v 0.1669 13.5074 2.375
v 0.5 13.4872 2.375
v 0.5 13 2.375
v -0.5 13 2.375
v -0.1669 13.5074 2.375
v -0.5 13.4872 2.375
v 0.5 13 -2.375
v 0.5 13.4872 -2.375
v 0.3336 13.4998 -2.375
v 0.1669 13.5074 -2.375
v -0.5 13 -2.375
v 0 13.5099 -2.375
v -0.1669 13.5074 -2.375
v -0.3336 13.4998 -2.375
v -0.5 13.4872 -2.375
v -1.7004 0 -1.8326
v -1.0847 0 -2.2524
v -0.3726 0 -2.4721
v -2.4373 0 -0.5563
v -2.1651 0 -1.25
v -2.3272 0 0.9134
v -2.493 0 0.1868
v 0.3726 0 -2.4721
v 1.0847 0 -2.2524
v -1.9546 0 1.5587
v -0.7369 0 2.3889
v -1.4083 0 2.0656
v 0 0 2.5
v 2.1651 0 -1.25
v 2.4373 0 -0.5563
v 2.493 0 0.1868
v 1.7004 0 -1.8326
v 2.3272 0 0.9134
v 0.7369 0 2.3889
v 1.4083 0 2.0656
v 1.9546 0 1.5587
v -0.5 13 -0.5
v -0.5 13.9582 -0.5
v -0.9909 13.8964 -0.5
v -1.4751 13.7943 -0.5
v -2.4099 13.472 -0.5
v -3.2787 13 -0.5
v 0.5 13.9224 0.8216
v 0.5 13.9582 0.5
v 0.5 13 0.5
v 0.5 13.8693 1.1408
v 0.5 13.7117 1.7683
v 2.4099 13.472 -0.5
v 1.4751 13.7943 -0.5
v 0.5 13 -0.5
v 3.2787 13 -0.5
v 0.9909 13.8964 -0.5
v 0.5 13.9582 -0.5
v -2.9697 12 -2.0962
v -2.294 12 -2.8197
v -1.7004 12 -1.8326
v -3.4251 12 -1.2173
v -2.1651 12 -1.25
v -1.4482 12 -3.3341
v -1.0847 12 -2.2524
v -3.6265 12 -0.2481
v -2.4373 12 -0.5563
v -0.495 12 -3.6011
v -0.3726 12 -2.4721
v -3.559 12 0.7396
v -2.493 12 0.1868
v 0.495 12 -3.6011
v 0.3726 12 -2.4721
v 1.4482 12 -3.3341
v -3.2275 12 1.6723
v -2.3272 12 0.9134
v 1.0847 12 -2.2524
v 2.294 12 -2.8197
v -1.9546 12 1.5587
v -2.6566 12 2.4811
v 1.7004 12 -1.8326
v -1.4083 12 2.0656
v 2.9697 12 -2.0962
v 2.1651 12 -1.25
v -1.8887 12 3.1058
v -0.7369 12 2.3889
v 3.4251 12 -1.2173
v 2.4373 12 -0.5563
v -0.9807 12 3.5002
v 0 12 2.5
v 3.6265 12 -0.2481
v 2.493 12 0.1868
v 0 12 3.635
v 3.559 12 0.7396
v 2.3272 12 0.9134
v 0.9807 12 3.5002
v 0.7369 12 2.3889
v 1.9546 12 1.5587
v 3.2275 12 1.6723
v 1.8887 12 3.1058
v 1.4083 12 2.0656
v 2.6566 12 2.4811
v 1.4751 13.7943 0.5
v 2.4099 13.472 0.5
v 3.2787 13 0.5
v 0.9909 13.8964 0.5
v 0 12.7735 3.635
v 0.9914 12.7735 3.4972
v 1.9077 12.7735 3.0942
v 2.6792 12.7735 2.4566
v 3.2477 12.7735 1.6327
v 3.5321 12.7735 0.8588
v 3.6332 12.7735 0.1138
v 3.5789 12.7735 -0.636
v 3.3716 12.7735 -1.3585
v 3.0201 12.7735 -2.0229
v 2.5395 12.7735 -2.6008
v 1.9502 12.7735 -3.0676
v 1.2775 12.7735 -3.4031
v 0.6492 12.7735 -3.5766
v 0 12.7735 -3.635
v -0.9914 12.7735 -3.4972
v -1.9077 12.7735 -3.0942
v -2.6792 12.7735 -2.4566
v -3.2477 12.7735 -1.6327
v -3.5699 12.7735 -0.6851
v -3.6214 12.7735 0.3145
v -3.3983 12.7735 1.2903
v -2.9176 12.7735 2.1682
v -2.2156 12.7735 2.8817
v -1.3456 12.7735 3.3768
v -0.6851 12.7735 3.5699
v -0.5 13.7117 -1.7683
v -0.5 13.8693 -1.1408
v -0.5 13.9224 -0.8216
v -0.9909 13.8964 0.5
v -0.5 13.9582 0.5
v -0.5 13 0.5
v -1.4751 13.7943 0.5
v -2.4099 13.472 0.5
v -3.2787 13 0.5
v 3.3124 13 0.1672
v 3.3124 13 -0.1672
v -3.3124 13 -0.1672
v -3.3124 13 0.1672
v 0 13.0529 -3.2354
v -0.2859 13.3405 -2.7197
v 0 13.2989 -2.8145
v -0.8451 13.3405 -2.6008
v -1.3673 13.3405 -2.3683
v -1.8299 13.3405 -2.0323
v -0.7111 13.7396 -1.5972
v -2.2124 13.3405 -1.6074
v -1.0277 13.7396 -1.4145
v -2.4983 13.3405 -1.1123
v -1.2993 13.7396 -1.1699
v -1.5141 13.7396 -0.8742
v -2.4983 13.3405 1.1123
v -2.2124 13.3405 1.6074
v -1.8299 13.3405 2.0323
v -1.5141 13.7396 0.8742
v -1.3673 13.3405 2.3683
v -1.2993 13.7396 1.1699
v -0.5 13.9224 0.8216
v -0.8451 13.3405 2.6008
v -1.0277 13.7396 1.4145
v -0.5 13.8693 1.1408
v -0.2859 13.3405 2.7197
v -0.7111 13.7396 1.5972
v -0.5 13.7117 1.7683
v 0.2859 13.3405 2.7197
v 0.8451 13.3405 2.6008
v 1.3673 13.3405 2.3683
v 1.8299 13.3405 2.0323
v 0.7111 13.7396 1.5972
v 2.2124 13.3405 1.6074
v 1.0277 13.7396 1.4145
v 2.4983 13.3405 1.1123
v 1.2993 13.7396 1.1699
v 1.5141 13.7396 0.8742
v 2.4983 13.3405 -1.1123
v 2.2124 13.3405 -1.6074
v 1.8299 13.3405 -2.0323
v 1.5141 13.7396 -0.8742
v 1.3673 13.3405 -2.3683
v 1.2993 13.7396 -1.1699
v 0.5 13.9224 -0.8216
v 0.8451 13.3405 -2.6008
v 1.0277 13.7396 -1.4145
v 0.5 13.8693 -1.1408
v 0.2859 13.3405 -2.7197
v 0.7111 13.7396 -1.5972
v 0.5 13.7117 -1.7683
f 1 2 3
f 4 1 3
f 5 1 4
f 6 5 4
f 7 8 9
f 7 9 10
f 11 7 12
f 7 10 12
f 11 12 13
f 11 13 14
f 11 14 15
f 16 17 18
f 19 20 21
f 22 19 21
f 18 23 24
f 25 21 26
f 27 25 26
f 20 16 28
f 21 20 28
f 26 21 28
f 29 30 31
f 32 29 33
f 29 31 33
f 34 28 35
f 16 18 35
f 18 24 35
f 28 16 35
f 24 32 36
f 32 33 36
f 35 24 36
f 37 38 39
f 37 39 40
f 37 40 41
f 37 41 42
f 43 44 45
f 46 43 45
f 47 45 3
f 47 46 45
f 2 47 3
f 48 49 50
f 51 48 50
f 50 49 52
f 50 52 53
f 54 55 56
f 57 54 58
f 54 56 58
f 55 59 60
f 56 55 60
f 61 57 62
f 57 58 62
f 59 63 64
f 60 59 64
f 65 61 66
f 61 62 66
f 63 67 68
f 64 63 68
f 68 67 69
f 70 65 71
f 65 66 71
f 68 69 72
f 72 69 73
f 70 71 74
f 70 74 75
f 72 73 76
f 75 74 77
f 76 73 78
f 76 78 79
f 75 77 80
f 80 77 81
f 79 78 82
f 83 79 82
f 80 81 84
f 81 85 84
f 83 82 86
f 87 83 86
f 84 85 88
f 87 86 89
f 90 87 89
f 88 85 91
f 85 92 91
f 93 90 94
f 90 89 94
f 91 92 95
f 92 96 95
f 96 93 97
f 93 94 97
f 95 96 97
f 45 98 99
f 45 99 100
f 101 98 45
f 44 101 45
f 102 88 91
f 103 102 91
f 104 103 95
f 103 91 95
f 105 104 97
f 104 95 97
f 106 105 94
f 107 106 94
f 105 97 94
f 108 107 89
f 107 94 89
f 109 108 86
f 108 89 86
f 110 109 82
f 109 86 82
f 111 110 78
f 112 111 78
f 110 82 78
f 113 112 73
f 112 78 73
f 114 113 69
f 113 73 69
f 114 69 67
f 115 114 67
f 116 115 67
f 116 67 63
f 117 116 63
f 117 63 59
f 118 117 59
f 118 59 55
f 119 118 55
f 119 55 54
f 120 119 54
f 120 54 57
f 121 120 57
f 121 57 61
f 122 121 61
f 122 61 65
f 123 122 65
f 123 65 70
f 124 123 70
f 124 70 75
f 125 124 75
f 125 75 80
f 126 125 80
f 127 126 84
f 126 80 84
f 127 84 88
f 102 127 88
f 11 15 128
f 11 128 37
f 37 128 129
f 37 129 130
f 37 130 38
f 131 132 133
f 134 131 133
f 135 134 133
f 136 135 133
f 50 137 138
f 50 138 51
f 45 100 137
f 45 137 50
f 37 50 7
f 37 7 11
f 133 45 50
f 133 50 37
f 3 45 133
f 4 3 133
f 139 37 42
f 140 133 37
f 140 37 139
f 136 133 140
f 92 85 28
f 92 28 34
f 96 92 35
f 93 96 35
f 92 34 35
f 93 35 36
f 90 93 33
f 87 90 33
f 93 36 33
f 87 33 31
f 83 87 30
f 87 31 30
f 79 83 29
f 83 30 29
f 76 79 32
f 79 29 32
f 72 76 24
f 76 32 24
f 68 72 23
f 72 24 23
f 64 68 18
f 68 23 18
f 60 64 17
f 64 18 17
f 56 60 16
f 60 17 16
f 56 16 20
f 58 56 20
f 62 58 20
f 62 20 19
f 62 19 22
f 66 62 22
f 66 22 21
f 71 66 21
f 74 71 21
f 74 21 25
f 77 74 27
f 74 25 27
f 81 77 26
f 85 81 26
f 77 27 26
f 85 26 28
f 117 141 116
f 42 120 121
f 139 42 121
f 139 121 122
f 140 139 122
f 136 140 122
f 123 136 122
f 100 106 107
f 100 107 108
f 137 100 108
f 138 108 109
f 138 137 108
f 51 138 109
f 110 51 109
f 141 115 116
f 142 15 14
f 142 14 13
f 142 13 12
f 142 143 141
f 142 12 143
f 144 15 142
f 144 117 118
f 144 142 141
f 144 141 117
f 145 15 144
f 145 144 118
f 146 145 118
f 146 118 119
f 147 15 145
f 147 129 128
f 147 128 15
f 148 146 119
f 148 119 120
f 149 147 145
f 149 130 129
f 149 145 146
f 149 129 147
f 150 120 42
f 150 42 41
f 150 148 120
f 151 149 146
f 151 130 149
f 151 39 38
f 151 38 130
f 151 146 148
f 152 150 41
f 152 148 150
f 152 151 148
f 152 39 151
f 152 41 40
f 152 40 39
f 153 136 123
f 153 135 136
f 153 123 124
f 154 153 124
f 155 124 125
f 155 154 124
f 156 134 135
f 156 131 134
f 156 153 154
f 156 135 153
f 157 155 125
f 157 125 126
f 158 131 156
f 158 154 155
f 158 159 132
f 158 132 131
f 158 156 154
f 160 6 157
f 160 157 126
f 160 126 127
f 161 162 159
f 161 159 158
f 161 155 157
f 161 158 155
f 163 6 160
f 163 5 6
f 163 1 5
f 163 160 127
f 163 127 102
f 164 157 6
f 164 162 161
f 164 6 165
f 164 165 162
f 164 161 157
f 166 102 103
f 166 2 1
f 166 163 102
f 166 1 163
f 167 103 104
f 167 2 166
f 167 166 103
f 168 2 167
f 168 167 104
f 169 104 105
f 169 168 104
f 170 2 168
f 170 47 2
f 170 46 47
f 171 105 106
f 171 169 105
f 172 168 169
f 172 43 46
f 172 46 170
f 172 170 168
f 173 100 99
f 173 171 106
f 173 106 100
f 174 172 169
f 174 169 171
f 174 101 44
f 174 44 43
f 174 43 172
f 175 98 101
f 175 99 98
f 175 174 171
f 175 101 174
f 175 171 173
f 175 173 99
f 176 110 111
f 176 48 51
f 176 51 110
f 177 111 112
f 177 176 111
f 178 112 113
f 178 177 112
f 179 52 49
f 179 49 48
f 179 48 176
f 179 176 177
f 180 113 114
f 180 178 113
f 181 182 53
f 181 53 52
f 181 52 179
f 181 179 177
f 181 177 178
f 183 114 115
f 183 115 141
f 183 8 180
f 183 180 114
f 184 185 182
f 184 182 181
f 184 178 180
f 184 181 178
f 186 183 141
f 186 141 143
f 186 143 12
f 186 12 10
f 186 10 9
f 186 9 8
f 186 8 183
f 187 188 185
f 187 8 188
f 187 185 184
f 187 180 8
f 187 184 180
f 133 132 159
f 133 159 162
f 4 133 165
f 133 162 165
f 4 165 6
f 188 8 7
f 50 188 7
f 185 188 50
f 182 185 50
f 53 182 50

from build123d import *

# Parameters (mm, degrees)
SKETCH_1_R          = 2.5
EXTRUDE_1_DEPTH     = 12
SKETCH_2_R          = 3.635
EXTRUDE_2_DEPTH     = 2
SKETCH_3_W          = 10.772084644
SKETCH_3_H          = 1
CUT_EXTRUDE_1_DEPTH = 1
SKETCH_4_W          = 1
SKETCH_4_H          = 4.75
CUT_EXTRUDE_2_DEPTH = 1


with BuildPart() as part:
    # 草图1 → 拉伸1 (new body)
    with BuildSketch(Plane(origin=(0, 0, 0), x_dir=(1, 0, 0), z_dir=(0, 1, 0))):
        with Locations(Location((0, 0, 0), (0, 0, 270))):
            Circle(SKETCH_1_R)
    extrude(amount=EXTRUDE_1_DEPTH)

    # 草图2 → 拉伸2 (add)
    with BuildSketch(Plane(origin=(0, 12, 0), x_dir=(-1, 0, 0), z_dir=(0, 1, 0))):
        with Locations(Location((0, 0, 0), (0, 0, 90))):
            Circle(SKETCH_2_R)
    extrude(amount=EXTRUDE_2_DEPTH)

    # 草图3 → 切除-拉伸1 (cut)
    with BuildSketch(Plane(origin=(0, 14, 0), x_dir=(-1, 0, 0), z_dir=(0, 1, 0))):
        Rectangle(SKETCH_3_W, SKETCH_3_H)
    extrude(amount=-CUT_EXTRUDE_1_DEPTH, mode=Mode.SUBTRACT)

    # 草图4 → 切除-拉伸2 (cut)
    with BuildSketch(Plane(origin=(0, 14, 0), x_dir=(-1, 0, 0), z_dir=(0, 1, 0))):
        Rectangle(SKETCH_4_W, SKETCH_4_H)
    extrude(amount=-CUT_EXTRUDE_2_DEPTH, mode=Mode.SUBTRACT)

    # 草图5 → 切除-旋转16 (revolve, cut)
    with BuildSketch(Plane(origin=(0, 0, 0), x_dir=(0, 0, -1), z_dir=(1, 0, 0)), mode=Mode.PRIVATE) as cut_revolve_16_sk:
        with BuildLine():
            Line((0, 14.65344885), (-4.227714807, 14.65344885))
            Line((-4.227714807, 14.65344885), (-4.227714807, 12.257514241))
            ThreePointArc((-4.227714807, 12.257514241), (-2.28636333, 13.54730049), (0, 14))
            Line((0, 14), (0, 14.65344885))
        make_face()
    revolve(cut_revolve_16_sk.sketch.rotate(Axis((0, -2.105917543, 0), (0, 1, 0)), 180), axis=Axis((0, -2.105917543, 0), (0, 1, 0)), mode=Mode.SUBTRACT)


solid = part.part
